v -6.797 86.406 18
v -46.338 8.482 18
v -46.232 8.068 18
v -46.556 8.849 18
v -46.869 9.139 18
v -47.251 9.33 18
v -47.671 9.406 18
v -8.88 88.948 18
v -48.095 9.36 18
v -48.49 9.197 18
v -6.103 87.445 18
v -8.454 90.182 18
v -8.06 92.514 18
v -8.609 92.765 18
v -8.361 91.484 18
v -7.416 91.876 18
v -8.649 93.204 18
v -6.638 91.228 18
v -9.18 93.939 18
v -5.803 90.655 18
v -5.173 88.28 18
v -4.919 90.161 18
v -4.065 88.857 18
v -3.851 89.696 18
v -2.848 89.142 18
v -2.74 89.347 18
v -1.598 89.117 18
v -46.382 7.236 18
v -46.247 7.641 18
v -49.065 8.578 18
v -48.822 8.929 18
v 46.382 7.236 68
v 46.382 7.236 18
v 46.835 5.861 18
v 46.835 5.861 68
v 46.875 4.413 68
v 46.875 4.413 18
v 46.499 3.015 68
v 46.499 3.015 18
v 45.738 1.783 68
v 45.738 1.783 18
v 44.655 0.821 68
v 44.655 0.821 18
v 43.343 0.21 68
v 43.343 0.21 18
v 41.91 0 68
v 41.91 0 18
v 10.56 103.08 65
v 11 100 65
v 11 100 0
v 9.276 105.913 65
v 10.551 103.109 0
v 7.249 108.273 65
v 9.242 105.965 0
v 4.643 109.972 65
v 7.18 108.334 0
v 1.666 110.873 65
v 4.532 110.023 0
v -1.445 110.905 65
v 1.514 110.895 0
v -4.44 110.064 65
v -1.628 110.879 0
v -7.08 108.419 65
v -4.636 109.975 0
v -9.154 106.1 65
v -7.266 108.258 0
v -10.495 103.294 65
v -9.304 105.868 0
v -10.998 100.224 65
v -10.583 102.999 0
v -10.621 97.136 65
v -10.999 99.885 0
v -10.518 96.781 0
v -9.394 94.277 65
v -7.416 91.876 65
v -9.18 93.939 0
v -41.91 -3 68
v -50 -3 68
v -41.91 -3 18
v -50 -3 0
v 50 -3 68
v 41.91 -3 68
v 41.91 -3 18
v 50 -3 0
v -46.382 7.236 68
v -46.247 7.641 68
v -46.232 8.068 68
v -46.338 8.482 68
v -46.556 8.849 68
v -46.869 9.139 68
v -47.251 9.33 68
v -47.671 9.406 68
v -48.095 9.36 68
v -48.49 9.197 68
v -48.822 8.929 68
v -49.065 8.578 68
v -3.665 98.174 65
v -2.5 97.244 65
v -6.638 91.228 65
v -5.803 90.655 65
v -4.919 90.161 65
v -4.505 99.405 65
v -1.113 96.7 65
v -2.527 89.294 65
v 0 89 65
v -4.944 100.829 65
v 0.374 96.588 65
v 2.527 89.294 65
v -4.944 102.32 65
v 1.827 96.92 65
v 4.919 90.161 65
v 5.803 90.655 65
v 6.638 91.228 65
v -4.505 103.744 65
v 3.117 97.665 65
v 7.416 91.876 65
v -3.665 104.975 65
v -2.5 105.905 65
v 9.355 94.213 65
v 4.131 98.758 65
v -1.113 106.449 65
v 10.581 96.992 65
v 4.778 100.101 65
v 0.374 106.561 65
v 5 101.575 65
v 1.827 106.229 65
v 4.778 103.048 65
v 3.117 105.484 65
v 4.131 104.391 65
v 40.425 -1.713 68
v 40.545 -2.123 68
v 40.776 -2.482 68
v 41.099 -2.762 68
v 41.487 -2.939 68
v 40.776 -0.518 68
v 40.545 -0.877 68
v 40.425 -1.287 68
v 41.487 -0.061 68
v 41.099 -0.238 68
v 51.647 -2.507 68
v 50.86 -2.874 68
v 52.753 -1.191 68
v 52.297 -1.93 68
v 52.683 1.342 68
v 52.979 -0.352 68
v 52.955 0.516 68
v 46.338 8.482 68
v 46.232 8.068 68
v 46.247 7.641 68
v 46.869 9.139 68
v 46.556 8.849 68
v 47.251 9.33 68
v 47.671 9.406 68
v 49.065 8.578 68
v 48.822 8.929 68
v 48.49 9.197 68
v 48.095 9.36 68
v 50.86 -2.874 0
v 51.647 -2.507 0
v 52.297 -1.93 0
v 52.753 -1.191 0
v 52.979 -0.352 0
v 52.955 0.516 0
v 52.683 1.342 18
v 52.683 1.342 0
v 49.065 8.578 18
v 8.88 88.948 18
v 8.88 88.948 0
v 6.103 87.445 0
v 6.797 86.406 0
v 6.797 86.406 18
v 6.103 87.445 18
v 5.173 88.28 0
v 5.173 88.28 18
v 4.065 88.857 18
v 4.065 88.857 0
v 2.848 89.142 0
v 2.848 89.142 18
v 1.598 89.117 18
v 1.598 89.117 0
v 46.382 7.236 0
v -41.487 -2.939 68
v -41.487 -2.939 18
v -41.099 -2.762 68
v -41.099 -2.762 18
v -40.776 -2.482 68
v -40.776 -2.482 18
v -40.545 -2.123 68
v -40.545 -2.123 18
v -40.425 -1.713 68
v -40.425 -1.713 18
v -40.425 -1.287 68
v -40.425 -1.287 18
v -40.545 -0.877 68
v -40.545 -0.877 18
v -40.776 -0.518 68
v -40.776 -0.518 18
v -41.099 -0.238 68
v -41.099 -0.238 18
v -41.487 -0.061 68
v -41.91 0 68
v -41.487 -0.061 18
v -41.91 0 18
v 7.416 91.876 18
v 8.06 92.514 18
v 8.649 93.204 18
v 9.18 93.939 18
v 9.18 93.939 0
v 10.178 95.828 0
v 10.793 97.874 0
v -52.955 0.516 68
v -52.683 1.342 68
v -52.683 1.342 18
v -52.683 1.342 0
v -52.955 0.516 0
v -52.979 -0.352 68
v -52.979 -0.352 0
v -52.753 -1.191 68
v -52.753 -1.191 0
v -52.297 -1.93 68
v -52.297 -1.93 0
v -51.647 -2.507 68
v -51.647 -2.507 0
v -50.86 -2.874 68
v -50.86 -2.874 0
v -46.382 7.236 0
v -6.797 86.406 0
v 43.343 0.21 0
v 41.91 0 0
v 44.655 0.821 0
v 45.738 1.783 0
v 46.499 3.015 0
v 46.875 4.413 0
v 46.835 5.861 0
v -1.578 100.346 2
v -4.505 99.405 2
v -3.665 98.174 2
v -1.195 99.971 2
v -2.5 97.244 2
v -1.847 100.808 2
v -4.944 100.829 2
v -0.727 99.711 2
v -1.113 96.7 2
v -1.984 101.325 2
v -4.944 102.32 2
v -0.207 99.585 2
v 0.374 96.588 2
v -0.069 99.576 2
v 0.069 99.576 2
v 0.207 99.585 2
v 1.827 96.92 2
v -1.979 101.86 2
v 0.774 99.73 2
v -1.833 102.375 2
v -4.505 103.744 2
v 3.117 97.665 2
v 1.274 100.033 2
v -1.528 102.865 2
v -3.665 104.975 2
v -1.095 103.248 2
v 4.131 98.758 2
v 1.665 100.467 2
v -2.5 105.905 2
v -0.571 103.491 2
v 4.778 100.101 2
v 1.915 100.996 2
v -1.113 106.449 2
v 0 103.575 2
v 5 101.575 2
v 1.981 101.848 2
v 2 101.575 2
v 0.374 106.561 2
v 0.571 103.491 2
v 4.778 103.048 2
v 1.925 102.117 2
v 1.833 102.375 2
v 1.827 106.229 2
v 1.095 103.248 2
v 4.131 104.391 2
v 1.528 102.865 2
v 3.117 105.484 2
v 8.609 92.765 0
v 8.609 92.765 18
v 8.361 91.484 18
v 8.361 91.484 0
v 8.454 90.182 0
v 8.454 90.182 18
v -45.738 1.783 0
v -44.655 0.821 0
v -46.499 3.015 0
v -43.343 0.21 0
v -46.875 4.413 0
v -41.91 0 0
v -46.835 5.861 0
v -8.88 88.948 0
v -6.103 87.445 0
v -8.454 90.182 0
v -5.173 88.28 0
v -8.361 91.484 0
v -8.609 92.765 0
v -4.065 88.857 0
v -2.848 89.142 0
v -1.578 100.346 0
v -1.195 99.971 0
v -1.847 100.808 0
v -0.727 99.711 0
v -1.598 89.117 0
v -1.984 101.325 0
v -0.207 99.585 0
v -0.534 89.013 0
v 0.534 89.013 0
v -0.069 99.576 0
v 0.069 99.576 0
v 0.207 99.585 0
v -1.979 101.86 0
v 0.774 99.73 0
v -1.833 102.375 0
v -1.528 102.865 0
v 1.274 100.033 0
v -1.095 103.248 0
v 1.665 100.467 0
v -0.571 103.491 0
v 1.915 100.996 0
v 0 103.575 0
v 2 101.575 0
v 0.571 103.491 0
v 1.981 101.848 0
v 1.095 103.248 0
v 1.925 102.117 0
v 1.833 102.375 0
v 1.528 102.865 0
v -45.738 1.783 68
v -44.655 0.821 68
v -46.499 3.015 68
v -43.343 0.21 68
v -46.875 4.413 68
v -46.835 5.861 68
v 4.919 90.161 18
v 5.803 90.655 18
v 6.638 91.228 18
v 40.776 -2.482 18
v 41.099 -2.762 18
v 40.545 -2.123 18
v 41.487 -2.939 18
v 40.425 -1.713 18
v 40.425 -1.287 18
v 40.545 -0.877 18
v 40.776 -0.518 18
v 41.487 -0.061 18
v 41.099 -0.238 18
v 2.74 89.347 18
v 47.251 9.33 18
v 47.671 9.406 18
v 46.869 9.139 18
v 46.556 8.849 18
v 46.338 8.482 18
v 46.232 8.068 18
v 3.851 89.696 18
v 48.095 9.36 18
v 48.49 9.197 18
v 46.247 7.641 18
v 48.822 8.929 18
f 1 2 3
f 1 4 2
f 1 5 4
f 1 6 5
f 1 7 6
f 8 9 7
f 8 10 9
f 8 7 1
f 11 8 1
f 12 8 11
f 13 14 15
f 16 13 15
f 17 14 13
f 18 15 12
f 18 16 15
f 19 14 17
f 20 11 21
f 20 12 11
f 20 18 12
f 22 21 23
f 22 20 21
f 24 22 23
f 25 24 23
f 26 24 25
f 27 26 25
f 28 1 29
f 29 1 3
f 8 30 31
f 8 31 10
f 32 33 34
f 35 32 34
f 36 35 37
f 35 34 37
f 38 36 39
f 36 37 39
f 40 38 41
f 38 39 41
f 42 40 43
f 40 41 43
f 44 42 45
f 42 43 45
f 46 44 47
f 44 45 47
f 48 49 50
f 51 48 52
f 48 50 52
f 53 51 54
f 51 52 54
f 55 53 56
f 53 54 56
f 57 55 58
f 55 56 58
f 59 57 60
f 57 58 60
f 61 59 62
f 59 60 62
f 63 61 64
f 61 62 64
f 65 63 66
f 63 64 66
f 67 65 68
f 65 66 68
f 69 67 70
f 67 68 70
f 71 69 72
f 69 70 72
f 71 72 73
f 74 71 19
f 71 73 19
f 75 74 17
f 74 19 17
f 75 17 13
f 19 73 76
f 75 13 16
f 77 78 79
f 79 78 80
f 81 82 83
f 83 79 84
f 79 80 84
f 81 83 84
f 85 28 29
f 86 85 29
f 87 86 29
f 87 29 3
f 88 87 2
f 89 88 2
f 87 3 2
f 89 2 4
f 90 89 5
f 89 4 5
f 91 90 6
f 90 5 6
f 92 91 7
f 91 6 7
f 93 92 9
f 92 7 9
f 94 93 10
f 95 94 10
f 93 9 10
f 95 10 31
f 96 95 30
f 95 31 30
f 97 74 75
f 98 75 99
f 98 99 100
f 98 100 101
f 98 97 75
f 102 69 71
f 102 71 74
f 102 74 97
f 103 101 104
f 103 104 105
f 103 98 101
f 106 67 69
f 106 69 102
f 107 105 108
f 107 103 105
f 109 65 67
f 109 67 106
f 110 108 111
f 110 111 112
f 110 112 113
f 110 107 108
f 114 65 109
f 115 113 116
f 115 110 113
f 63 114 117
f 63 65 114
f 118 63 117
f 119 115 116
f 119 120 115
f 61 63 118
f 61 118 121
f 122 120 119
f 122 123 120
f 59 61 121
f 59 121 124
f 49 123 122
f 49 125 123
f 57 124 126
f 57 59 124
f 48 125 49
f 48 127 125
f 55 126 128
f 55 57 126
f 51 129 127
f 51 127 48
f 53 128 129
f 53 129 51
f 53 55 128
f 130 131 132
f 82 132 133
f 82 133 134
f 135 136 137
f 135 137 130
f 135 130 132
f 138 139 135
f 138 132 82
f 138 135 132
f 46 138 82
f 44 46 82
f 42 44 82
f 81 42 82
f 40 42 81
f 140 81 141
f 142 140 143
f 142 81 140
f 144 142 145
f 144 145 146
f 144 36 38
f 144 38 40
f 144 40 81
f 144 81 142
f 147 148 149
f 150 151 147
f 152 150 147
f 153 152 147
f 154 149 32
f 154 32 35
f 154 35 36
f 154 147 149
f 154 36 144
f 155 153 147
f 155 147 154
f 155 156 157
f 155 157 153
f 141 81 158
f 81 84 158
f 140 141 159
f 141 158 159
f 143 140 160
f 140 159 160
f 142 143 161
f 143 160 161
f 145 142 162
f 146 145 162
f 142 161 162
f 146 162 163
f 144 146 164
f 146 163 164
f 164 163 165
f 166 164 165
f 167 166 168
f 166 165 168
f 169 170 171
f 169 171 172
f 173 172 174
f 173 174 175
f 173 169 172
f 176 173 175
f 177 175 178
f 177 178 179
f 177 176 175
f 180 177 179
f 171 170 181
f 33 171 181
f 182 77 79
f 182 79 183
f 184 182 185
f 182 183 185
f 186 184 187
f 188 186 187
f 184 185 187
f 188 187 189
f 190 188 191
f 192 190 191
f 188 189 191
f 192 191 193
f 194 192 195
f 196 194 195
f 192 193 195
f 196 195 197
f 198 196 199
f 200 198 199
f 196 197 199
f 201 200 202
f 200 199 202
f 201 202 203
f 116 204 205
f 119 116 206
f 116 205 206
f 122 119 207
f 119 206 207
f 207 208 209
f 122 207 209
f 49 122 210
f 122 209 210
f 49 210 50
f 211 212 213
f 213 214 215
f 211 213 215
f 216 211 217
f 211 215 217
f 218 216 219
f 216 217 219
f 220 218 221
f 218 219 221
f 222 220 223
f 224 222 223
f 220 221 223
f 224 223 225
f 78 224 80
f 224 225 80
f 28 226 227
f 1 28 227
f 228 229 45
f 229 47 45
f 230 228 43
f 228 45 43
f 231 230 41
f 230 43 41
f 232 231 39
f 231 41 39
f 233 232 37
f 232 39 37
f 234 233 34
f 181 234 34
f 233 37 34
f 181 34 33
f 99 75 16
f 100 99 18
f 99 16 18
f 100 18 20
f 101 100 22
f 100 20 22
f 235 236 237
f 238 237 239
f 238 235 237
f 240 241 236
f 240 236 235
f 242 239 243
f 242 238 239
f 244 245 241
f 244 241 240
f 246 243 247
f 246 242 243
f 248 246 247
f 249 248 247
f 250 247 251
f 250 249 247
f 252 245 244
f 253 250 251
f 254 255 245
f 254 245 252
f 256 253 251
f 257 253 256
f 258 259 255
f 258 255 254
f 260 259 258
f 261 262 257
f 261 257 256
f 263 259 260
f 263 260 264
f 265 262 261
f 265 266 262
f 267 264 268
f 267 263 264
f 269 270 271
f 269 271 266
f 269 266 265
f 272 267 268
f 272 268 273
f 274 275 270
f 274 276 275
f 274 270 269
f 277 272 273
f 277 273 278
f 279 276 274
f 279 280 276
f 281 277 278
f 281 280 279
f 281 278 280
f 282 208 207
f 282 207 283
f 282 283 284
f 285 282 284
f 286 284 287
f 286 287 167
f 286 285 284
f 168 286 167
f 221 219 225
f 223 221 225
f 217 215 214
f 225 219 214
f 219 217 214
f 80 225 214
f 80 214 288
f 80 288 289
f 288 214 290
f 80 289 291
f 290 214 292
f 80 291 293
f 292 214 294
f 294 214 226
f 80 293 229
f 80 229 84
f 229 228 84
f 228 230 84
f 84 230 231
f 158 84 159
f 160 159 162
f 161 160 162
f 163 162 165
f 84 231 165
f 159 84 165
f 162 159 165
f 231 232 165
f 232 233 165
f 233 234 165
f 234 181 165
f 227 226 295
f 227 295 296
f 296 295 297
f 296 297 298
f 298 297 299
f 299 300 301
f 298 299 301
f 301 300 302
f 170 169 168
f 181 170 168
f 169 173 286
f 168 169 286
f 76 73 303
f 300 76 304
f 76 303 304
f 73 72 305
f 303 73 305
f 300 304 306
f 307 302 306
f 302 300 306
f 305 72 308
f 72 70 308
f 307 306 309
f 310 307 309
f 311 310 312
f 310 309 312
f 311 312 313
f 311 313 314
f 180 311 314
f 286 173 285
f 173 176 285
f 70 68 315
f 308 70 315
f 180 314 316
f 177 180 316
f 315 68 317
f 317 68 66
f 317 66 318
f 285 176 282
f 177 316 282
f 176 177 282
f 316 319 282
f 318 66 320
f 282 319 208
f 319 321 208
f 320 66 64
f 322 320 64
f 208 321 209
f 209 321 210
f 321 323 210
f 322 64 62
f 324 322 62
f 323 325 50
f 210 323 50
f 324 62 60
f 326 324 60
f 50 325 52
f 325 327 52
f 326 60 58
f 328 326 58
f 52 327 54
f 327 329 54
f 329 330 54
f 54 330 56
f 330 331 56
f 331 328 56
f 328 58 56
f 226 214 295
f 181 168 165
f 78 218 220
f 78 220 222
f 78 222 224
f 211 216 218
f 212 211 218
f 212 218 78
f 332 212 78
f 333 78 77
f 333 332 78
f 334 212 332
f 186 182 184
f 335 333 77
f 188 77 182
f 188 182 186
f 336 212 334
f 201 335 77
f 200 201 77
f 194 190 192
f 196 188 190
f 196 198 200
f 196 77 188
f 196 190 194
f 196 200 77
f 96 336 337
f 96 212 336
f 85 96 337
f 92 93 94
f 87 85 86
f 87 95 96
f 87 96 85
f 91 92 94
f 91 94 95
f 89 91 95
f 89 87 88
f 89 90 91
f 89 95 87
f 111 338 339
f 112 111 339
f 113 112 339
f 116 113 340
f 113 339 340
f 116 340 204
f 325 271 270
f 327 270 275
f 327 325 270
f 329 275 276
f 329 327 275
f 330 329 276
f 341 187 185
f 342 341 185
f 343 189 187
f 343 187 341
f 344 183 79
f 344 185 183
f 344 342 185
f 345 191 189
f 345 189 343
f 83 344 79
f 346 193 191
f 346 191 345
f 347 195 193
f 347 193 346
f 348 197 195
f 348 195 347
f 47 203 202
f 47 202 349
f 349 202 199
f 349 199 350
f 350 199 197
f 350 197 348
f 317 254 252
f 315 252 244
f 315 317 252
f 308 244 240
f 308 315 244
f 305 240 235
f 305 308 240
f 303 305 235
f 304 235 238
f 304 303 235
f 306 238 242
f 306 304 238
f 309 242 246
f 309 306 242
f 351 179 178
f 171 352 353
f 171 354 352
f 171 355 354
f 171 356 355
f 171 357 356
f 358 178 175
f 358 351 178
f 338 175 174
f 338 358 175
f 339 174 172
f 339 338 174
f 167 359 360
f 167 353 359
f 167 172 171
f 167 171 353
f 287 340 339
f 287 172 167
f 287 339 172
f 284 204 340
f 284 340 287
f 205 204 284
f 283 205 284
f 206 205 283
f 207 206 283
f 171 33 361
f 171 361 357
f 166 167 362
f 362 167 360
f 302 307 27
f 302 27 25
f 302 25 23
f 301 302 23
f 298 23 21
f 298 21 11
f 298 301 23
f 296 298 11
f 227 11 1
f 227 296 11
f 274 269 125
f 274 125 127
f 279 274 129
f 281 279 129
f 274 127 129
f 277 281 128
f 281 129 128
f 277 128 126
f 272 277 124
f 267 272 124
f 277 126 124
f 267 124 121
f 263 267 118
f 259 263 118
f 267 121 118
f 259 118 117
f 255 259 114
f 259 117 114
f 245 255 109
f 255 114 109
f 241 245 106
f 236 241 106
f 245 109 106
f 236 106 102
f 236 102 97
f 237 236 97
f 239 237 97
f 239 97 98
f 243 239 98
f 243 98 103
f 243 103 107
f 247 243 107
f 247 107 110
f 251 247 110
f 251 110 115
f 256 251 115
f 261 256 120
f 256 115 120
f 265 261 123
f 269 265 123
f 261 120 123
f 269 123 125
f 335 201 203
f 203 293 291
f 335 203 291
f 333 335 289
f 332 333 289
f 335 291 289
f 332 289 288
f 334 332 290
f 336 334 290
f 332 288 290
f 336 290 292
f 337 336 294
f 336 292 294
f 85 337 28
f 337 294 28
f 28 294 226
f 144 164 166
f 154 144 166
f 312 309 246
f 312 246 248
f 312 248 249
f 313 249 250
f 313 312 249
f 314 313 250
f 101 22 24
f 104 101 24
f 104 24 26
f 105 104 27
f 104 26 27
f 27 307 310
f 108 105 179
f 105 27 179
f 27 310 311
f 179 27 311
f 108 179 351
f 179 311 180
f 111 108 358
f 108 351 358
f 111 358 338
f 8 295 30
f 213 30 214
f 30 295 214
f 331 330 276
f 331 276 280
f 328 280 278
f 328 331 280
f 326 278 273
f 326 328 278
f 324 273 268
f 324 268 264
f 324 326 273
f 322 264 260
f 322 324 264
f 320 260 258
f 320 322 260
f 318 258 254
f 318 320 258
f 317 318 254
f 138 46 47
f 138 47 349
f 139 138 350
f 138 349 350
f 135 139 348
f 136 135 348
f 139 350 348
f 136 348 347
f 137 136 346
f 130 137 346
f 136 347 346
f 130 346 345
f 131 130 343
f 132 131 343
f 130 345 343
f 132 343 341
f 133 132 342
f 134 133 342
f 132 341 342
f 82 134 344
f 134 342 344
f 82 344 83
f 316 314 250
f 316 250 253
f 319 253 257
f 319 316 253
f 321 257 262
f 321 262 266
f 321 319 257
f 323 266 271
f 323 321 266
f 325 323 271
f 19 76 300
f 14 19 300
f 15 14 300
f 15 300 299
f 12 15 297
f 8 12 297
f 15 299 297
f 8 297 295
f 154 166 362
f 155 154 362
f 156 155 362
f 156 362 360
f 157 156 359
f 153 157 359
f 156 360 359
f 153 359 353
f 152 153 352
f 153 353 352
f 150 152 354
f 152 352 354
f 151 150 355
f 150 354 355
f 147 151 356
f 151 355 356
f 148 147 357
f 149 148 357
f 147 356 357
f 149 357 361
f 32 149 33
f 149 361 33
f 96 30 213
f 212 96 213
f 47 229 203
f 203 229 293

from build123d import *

# Parameters (mm, degrees)
F1_DEPTH    = 65
F2_DEPTH    = 18
F3_DEPTH    = 65
F4_R        = 5
F5_T1_DEPTH = 18
F7_DEPTH    = 50
F8_R        = 5
F8_R_2      = 2
F9_DEPTH    = 63


# Not quite as in the source:
# - a fillet or chamfer that OpenCascade refuses, or shapes differently, is made with other operations: its cross-section is extruded or revolved along the edge and cut away or added


with BuildPart() as f1:
    # F0 (on Top) → F1 (new body)
    with BuildSketch(Plane.XY):
        with BuildLine():
            ThreePointArc((11, 100), (-4.4397297556, 110.0642336865), (-7.4161453995, 91.8759131335))
            Line((-7.4161453995, 91.8759131335), (-4.039885348, 98.6284332366))
            ThreePointArc((-4.039885348, 98.6284332366), (-1.5492858452, 106.3284184683), (5, 101.5745028853))
            ThreePointArc((5, 101.5745028853), (4.753915583, 100.0252170402), (4.039885348, 98.6284332366))
            Line((4.039885348, 98.6284332366), (7.4161453995, 91.8759131335))
            ThreePointArc((7.4161453995, 91.8759131335), (10.0642336865, 95.5602702444), (11, 100))
        make_face()
        with BuildLine():
            Line((-1.5839824005, 96.8320351991), (-4.9193495505, 90.161300899))
            ThreePointArc((-4.9193495505, 90.161300899), (0, 89), (4.9193495505, 90.161300899))
            Line((4.9193495505, 90.161300899), (1.5839824005, 96.8320351991))
            ThreePointArc((1.5839824005, 96.8320351991), (0, 96.5745028853), (-1.5839824005, 96.8320351991))
        make_face()
        with BuildLine():
            ThreePointArc((-7.4161453995, 91.8759131335), (-6.227044459, 90.9322595259), (-4.9193495505, 90.161300899))
            Line((-4.9193495505, 90.161300899), (-1.5839824005, 96.8320351991))
            ThreePointArc((-1.5839824005, 96.8320351991), (-2.9519033843, 97.5388782237), (-4.039885348, 98.6284332366))
            Line((-4.039885348, 98.6284332366), (-7.4161453995, 91.8759131335))
        make_face()
        with BuildLine():
            Line((1.5839824005, 96.8320351991), (4.9193495505, 90.161300899))
            ThreePointArc((4.9193495505, 90.161300899), (6.227044459, 90.9322595259), (7.4161453995, 91.8759131335))
            Line((7.4161453995, 91.8759131335), (4.039885348, 98.6284332366))
            ThreePointArc((4.039885348, 98.6284332366), (2.9519033843, 97.5388782237), (1.5839824005, 96.8320351991))
        make_face()
        with BuildLine():
            Line((-0.2073593004, 99.5852813993), (-1.5839824005, 96.8320351991))
            ThreePointArc((-1.5839824005, 96.8320351991), (0, 96.5745028853), (1.5839824005, 96.8320351991))
            Line((1.5839824005, 96.8320351991), (0.2073593004, 99.5852813993))
            ThreePointArc((0.2073593004, 99.5852813993), (0, 99.5745028853), (-0.2073593004, 99.5852813993))
        make_face()
        with BuildLine():
            ThreePointArc((-4.039885348, 98.6284332366), (-2.9519033843, 97.5388782237), (-1.5839824005, 96.8320351991))
            Line((-1.5839824005, 96.8320351991), (-0.2073593004, 99.5852813993))
            ThreePointArc((-0.2073593004, 99.5852813993), (-1.7280798318, 100.567656276), (-1.8327895721, 102.3750541855))
            ThreePointArc((-1.8327895721, 102.3750541855), (-2.3164003238, 101.9063812682), (-2.683281573, 101.3416407865))
            Line((-2.683281573, 101.3416407865), (-4.039885348, 98.6284332366))
        make_face()
        with BuildLine():
            ThreePointArc((5, 101.5745028853), (-1.5492858452, 106.3284184683), (-4.039885348, 98.6284332366))
            Line((-4.039885348, 98.6284332366), (-2.683281573, 101.3416407865))
            ThreePointArc((-2.683281573, 101.3416407865), (-2.3164003238, 101.9063812682), (-1.8327895721, 102.3750541855))
            ThreePointArc((-1.8327895721, 102.3750541855), (0, 103.5745028853), (1.8327895721, 102.3750541855))
            ThreePointArc((1.8327895721, 102.3750541855), (2.3164003238, 101.9063812682), (2.683281573, 101.3416407865))
            Line((2.683281573, 101.3416407865), (4.039885348, 98.6284332366))
            ThreePointArc((4.039885348, 98.6284332366), (4.753915583, 100.0252170402), (5, 101.5745028853))
        make_face()
        with BuildLine():
            Line((0.2073593004, 99.5852813993), (1.5839824005, 96.8320351991))
            ThreePointArc((1.5839824005, 96.8320351991), (2.9519033843, 97.5388782237), (4.039885348, 98.6284332366))
            Line((4.039885348, 98.6284332366), (2.683281573, 101.3416407865))
            ThreePointArc((2.683281573, 101.3416407865), (2.3164003238, 101.9063812682), (1.8327895721, 102.3750541855))
            ThreePointArc((1.8327895721, 102.3750541855), (1.9577511517, 101.9834166022), (2, 101.5745028853))
            ThreePointArc((2, 101.5745028853), (1.4857184459, 100.2356075572), (0.2073593004, 99.5852813993))
        make_face()
        with BuildLine():
            ThreePointArc((-1.8327895721, 102.3750541855), (-1.7280798318, 100.567656276), (-0.2073593004, 99.5852813993))
            Line((-0.2073593004, 99.5852813993), (0, 100))
            Line((0, 100), (0.2073593004, 99.5852813993))
            ThreePointArc((0.2073593004, 99.5852813993), (1.4857184459, 100.2356075572), (2, 101.5745028853))
            ThreePointArc((2, 101.5745028853), (1.9577511517, 101.9834166022), (1.8327895721, 102.3750541855))
            ThreePointArc((1.8327895721, 102.3750541855), (0, 103), (-1.8327895721, 102.3750541855))
        make_face()
        with BuildLine():
            Line((0, 100), (-0.2073593004, 99.5852813993))
            ThreePointArc((-0.2073593004, 99.5852813993), (0, 99.5745028853), (0.2073593004, 99.5852813993))
            Line((0.2073593004, 99.5852813993), (0, 100))
        make_face()
        with BuildLine():
            ThreePointArc((1.8327895721, 102.3750541855), (0, 103.5745028853), (-1.8327895721, 102.3750541855))
            ThreePointArc((-1.8327895721, 102.3750541855), (0, 103), (1.8327895721, 102.3750541855))
        make_face()
    extrude(amount=F1_DEPTH)

    # F0 (on Top) → F2 (join)
    with BuildSketch(Plane.XY):
        with BuildLine():
            Line((50, 0), (-50, 0))
            Line((-50, 0), (-4.9193495505, 90.161300899))
            ThreePointArc((-4.9193495505, 90.161300899), (-6.227044459, 90.9322595259), (-7.4161453995, 91.8759131335))
            Line((-7.4161453995, 91.8759131335), (-52.683281573, 1.3416407865))
            ThreePointArc((-52.683281573, 1.3416407865), (-52.5519524251, -1.5771933364), (-50, -3))
            Line((-50, -3), (50, -3))
            ThreePointArc((50, -3), (52.5519524251, -1.5771933364), (52.683281573, 1.3416407865))
            Line((52.683281573, 1.3416407865), (7.4161453995, 91.8759131335))
            ThreePointArc((7.4161453995, 91.8759131335), (6.227044459, 90.9322595259), (4.9193495505, 90.161300899))
            Line((4.9193495505, 90.161300899), (50, 0))
        make_face()
    extrude(amount=F2_DEPTH)

    # F0 (on Top) → F3 (cut)
    with BuildSketch(Plane.XY):
        with BuildLine():
            ThreePointArc((-1.8327895721, 102.3750541855), (-1.7280798318, 100.567656276), (-0.2073593004, 99.5852813993))
            Line((-0.2073593004, 99.5852813993), (0, 100))
            Line((0, 100), (0.2073593004, 99.5852813993))
            ThreePointArc((0.2073593004, 99.5852813993), (1.4857184459, 100.2356075572), (2, 101.5745028853))
            ThreePointArc((2, 101.5745028853), (1.9577511517, 101.9834166022), (1.8327895721, 102.3750541855))
            ThreePointArc((1.8327895721, 102.3750541855), (0, 103), (-1.8327895721, 102.3750541855))
        make_face()
        with BuildLine():
            ThreePointArc((1.8327895721, 102.3750541855), (0, 103.5745028853), (-1.8327895721, 102.3750541855))
            ThreePointArc((-1.8327895721, 102.3750541855), (0, 103), (1.8327895721, 102.3750541855))
        make_face()
        with BuildLine():
            Line((0, 100), (-0.2073593004, 99.5852813993))
            ThreePointArc((-0.2073593004, 99.5852813993), (0, 99.5745028853), (0.2073593004, 99.5852813993))
            Line((0.2073593004, 99.5852813993), (0, 100))
        make_face()
    extrude(amount=F3_DEPTH, mode=Mode.SUBTRACT)

    # F4
    f4_edges = [f1.edges().sort_by_distance(p)[0] for p in [
        (50, 0, 9),
    ]]
    fillet(f4_edges, radius=F4_R)

    # F5: fillet of radius 5 on 5 edges, made by hand

    # F5_s2 → F5_t1 (join)
    with BuildSketch(Plane.XY):
        with BuildLine():
            ThreePointArc((-41.9098300563, 0), (-46.163084098, 2.3713444394), (-46.3819660113, 7.2360679775))
            Line((-46.3819660113, 7.2360679775), (-50, 0))
            Line((-50, 0), (-41.9098300563, 0))
        make_face()
        with BuildLine():
            ThreePointArc((6.7970581872, 86.4058836256), (4.6367553585, 88.6032598618), (1.5983840346, 89.1167482581))
            ThreePointArc((1.5983840346, 89.1167482581), (3.3004522912, 89.5068110341), (4.9193495505, 90.161300899))
            Line((4.9193495505, 90.161300899), (6.7970581872, 86.4058836256))
        make_face()
        with BuildLine():
            ThreePointArc((9.1796312313, 93.9391114136), (8.361173547, 91.4837383605), (8.8800549269, 88.9480940786))
            Line((8.8800549269, 88.9480940786), (7.4161453995, 91.8759131335))
            ThreePointArc((7.4161453995, 91.8759131335), (8.3617669951, 92.8529129906), (9.1796312313, 93.9391114136))
        make_face()
        with BuildLine():
            ThreePointArc((-9.1796312313, 93.9391114136), (-8.361173547, 91.4837383605), (-8.8800549269, 88.9480940786))
            Line((-8.8800549269, 88.9480940786), (-7.4161453995, 91.8759131335))
            ThreePointArc((-7.4161453995, 91.8759131335), (-8.3617669951, 92.8529129906), (-9.1796312313, 93.9391114136))
        make_face()
        with BuildLine():
            ThreePointArc((-1.5983840346, 89.1167482581), (-4.6367553585, 88.6032598618), (-6.7970581872, 86.4058836256))
            Line((-6.7970581872, 86.4058836256), (-4.9193495505, 90.161300899))
            ThreePointArc((-4.9193495505, 90.161300899), (-3.3004522912, 89.5068110341), (-1.5983840346, 89.1167482581))
        make_face()
    extrude(amount=F5_T1_DEPTH)

    # F6 (on face) → F7 (join)
    with BuildSketch(Plane.XY.offset(18)):
        with BuildLine():
            ThreePointArc((41.9098300563, 0), (40.4098300563, -1.5), (41.9098300563, -3))
            Line((41.9098300563, -3), (50, -3))
            ThreePointArc((50, -3), (52.5519524251, -1.5771933364), (52.683281573, 1.3416407865))
            Line((52.683281573, 1.3416407865), (49.0652475842, 8.577708764))
            ThreePointArc((49.0652475842, 8.577708764), (47.0527864045, 9.2485291572), (46.3819660113, 7.2360679775))
            ThreePointArc((46.3819660113, 7.2360679775), (46.163084098, 2.3713444394), (41.9098300563, 0))
        make_face()
        with BuildLine():
            Line((-50, -3), (-41.9098300563, -3))
            ThreePointArc((-41.9098300563, -3), (-40.4098300563, -1.5), (-41.9098300563, 0))
            ThreePointArc((-41.9098300563, 0), (-46.163084098, 2.3713444394), (-46.3819660113, 7.2360679775))
            ThreePointArc((-46.3819660113, 7.2360679775), (-47.0527864045, 9.2485291572), (-49.0652475842, 8.577708764))
            Line((-49.0652475842, 8.577708764), (-52.683281573, 1.3416407865))
            ThreePointArc((-52.683281573, 1.3416407865), (-52.5519524251, -1.5771933364), (-50, -3))
        make_face()
    extrude(amount=F7_DEPTH)

    # F8 (on face) → F9 (cut)
    with BuildSketch(Plane.XY.offset(65)):
        with Locations((0, 101.5745028853)):
            Circle(F8_R)
        with Locations((0, 101.5745028853)):
            Circle(F8_R_2, mode=Mode.SUBTRACT)
    extrude(amount=-F9_DEPTH, mode=Mode.SUBTRACT)


solid = f1.part
